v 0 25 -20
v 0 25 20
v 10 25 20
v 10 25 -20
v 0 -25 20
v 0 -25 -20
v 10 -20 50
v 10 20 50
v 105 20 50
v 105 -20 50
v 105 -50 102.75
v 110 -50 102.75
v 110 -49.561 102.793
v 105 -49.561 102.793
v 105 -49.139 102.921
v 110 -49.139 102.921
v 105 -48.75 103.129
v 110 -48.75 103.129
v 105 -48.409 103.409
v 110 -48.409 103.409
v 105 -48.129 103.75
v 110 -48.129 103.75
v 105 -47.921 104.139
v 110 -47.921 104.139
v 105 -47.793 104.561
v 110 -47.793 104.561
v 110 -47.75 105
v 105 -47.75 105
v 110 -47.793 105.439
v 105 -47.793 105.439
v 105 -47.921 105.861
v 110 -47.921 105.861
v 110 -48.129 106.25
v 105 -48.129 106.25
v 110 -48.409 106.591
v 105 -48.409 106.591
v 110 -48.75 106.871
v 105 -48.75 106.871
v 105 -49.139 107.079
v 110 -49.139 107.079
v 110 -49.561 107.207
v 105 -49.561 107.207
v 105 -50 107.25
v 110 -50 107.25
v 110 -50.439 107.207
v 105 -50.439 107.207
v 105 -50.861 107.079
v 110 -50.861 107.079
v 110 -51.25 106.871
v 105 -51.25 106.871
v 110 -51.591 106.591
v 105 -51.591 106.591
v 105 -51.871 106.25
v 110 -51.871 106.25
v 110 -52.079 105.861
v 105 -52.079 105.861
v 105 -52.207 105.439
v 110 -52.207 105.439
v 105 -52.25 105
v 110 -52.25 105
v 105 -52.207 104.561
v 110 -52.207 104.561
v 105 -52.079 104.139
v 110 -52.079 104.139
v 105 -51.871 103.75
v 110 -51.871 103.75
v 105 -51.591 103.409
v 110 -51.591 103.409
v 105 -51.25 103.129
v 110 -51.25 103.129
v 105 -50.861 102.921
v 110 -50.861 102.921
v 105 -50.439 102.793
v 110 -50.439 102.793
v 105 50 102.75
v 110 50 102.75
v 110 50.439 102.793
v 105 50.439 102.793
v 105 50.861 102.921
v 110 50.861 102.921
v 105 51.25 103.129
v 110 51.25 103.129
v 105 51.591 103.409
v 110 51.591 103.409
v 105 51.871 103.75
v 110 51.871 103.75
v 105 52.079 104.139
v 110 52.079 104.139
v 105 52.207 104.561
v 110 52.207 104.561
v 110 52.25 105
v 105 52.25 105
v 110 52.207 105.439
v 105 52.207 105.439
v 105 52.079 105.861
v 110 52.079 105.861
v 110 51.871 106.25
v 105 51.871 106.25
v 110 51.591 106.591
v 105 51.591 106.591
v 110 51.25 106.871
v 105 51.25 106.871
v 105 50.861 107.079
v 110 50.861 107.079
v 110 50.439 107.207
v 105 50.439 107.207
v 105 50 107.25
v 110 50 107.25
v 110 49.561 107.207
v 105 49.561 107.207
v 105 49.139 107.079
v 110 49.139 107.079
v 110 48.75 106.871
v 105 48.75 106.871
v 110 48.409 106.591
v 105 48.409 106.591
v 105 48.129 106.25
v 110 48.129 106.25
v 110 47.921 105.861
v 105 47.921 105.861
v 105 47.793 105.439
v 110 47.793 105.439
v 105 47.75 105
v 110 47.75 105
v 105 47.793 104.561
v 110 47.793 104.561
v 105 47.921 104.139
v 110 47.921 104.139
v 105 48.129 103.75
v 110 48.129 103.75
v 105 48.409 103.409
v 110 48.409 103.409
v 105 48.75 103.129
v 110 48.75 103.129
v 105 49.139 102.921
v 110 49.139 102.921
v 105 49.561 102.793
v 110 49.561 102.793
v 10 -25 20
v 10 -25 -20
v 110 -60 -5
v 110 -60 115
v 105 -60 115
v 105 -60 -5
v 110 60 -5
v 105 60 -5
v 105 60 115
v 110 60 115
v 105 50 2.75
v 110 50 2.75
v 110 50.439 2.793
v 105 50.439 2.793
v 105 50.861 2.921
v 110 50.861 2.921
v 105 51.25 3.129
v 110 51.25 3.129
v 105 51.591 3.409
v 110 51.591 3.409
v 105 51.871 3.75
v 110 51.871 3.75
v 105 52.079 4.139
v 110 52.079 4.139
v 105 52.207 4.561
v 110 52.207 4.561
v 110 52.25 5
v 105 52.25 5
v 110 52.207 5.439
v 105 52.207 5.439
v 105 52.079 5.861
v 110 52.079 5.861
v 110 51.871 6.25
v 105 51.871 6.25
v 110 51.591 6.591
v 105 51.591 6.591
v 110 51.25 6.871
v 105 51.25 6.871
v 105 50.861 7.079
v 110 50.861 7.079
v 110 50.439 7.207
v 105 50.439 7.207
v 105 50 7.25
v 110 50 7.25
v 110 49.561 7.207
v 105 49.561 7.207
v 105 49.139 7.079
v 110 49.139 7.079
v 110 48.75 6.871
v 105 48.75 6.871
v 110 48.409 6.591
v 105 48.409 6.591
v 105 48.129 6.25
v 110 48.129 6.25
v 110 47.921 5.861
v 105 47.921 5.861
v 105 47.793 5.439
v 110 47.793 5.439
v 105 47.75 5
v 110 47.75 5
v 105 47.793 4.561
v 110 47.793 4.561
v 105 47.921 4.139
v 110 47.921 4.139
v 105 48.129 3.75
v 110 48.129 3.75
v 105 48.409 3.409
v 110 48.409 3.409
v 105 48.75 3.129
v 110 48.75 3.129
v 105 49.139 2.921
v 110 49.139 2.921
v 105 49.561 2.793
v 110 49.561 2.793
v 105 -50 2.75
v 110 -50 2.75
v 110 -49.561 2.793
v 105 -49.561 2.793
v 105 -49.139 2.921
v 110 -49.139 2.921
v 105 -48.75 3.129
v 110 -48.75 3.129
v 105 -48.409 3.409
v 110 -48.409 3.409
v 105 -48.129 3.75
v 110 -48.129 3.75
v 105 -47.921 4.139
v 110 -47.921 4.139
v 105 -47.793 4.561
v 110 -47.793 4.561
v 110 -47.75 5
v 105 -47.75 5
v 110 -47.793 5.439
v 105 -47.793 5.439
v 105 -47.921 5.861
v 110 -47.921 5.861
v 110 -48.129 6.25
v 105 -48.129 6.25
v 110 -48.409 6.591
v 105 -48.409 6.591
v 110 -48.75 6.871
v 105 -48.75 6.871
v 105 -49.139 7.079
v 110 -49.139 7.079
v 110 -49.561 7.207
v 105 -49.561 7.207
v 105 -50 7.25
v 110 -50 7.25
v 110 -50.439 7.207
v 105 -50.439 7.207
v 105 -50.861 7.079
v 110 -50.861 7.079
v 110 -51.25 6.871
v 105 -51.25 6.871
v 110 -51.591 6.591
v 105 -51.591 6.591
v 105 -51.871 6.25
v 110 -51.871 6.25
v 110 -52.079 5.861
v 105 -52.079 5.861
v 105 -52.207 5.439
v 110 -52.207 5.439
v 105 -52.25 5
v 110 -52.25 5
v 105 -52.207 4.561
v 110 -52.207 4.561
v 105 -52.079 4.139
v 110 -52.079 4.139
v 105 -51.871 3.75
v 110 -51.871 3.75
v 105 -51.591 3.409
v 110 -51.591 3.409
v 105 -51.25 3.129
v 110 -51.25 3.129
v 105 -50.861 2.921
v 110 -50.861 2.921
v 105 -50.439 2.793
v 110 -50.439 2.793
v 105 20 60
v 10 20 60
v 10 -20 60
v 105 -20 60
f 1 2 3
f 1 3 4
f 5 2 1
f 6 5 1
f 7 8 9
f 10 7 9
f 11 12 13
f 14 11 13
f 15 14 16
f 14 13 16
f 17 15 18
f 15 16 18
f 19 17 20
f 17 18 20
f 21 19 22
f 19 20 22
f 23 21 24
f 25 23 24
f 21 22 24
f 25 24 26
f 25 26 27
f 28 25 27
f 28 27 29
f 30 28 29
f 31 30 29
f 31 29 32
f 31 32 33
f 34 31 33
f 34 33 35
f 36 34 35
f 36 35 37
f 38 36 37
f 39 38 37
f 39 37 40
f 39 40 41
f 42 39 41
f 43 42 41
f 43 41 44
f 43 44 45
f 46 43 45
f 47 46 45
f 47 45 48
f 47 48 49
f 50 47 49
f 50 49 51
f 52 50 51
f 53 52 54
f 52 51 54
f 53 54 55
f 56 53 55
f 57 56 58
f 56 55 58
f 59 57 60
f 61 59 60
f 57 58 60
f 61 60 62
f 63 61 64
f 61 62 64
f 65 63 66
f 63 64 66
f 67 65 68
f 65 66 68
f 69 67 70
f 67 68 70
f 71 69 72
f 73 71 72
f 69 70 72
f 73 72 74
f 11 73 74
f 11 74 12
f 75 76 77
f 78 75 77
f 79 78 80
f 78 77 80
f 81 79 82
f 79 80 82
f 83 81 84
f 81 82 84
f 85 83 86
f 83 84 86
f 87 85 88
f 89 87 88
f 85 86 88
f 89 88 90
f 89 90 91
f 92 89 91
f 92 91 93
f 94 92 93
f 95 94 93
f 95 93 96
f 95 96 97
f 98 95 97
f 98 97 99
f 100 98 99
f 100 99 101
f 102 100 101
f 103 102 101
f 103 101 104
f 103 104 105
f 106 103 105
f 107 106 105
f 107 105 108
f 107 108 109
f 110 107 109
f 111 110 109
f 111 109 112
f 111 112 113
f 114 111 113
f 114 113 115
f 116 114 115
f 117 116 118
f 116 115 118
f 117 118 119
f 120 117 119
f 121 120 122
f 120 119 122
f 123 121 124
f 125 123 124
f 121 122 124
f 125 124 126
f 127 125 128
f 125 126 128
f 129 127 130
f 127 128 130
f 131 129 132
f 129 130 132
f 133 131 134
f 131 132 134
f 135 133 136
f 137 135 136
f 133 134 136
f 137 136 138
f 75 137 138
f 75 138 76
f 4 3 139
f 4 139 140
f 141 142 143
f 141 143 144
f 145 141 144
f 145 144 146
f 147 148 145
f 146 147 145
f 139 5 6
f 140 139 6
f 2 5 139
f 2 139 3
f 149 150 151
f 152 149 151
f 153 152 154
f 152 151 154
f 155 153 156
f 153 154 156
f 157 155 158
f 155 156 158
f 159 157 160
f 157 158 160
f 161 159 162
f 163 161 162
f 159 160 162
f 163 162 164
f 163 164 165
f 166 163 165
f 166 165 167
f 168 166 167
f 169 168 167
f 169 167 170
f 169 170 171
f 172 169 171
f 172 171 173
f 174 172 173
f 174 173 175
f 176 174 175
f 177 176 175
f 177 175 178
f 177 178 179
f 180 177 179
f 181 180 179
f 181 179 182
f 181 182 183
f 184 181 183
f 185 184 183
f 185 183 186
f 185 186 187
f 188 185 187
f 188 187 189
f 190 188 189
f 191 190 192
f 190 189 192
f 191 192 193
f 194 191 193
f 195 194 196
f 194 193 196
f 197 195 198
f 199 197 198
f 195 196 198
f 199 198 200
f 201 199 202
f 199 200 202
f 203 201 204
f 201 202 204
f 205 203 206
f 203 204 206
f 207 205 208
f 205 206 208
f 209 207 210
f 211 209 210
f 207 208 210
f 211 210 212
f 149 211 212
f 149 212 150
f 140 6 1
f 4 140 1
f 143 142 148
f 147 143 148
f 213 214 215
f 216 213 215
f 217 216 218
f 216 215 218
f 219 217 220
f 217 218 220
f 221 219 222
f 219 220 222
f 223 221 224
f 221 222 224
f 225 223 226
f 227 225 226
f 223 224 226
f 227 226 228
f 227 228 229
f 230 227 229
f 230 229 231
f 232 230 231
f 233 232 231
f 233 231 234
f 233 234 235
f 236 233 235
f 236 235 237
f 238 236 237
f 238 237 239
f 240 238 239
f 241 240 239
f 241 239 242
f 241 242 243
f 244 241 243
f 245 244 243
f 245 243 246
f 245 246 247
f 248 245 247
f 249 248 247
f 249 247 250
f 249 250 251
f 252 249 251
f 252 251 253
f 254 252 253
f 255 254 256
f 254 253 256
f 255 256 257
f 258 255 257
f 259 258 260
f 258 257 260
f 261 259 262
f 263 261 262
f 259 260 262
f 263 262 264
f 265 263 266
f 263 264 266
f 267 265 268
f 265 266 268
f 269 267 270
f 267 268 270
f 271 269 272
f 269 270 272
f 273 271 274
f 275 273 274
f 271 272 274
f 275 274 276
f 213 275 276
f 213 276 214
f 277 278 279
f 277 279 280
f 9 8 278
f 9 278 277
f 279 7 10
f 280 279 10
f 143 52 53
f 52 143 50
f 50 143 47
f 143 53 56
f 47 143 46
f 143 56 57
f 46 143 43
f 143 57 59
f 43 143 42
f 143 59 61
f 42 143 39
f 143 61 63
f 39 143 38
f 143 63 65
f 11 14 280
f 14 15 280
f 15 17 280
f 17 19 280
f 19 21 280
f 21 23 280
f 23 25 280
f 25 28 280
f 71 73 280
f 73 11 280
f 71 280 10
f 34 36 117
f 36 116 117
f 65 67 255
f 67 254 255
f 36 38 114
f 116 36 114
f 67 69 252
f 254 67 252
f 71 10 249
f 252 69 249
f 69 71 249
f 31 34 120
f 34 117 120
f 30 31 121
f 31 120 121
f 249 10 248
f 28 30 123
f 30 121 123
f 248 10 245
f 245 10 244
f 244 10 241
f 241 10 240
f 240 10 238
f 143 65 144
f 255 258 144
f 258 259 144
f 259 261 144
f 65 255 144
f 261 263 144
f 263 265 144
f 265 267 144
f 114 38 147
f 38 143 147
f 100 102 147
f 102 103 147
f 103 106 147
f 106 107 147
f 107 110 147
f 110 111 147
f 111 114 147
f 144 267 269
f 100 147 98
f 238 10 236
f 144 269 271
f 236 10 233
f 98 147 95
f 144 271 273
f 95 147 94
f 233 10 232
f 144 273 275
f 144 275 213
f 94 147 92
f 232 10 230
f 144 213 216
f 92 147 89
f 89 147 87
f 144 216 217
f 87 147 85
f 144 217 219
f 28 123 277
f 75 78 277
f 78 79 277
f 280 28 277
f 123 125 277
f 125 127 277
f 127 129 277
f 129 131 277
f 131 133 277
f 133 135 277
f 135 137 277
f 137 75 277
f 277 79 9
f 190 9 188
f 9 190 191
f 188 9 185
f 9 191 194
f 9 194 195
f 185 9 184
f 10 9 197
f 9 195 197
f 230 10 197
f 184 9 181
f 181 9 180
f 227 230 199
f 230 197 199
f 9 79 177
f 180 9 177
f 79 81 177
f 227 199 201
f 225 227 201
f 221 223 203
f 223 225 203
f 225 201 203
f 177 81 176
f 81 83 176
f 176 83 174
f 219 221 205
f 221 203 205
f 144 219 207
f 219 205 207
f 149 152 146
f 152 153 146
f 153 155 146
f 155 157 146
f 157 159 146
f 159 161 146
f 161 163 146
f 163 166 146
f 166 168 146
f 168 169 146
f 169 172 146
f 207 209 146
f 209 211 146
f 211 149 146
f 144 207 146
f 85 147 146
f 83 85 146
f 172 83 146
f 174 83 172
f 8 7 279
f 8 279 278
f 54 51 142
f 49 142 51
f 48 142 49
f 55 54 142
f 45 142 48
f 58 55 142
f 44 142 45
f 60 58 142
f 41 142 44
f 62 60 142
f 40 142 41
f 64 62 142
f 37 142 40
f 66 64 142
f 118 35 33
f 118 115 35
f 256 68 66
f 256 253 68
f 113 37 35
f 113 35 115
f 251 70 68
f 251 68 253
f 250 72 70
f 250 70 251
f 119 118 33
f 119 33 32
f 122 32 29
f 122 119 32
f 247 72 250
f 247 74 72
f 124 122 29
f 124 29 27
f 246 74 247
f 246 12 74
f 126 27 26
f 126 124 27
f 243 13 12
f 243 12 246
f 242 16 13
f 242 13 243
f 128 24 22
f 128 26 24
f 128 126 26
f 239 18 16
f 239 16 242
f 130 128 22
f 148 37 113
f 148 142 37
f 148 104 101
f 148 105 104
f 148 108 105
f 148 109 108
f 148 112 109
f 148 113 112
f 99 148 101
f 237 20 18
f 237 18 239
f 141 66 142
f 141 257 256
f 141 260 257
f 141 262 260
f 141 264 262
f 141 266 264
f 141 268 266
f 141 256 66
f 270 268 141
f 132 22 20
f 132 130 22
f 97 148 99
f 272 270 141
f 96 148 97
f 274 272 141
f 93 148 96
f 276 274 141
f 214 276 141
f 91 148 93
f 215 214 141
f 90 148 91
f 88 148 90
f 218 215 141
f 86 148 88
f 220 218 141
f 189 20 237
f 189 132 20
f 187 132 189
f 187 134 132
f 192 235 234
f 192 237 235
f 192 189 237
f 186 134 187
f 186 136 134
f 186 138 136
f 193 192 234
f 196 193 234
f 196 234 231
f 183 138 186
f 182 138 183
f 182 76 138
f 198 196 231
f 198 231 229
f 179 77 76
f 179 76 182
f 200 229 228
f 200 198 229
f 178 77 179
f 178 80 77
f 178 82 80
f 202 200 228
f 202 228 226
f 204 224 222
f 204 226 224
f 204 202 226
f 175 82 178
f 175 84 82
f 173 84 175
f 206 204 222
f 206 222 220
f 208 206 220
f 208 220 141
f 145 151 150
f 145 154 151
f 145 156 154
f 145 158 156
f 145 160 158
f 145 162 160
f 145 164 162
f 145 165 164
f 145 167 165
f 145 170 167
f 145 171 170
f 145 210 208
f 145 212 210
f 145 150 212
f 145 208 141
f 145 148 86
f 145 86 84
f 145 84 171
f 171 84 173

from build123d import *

# Parameters (mm, degrees)
SKETCH1_W           = 40
SKETCH1_H           = 50
BOSS_EXTRUDE1_DEPTH = 10
SKETCH2_W           = 100
SKETCH2_H           = 40
BOSS_EXTRUDE2_DEPTH = 10
SKETCH3_W           = 120
SKETCH3_H           = 120
BOSS_EXTRUDE3_DEPTH = 5
SKETCH4_R           = 2.25
CUT_EXTRUDE1_DEPTH  = 10


with BuildPart() as part:
    # Sketch1 → Boss-Extrude1 (new body)
    with BuildSketch(Plane(origin=(0, 0, 0), x_dir=(0, 0, -1), z_dir=(1, 0, 0))):
        Rectangle(SKETCH1_W, SKETCH1_H)
    extrude(amount=BOSS_EXTRUDE1_DEPTH)


with BuildPart() as body_2:
    # Sketch2 → Boss-Extrude2 (new body)
    with BuildSketch(Plane.XY.offset(50)):
        with Locations((60, 0)):
            Rectangle(SKETCH2_W, SKETCH2_H)
    extrude(amount=BOSS_EXTRUDE2_DEPTH)

    # Sketch3 → Boss-Extrude3 (add)
    with BuildSketch(Plane(origin=(110, 0, 0), x_dir=(0, 0, -1), z_dir=(1, 0, 0))):
        with Locations((-55, 0)):
            Rectangle(SKETCH3_W, SKETCH3_H)
    extrude(amount=-BOSS_EXTRUDE3_DEPTH)

    # Sketch4 → Cut-Extrude1 (cut)
    with BuildSketch(Plane(origin=(110, 0, 0), x_dir=(0, 0, -1), z_dir=(1, 0, 0))):
        with Locations((-105, -50)):
            Circle(SKETCH4_R)
        with Locations((-105, 50)):
            Circle(SKETCH4_R)
        with Locations((-5, -50)):
            Circle(SKETCH4_R)
        with Locations((-5, 50)):
            Circle(SKETCH4_R)
    extrude(amount=-CUT_EXTRUDE1_DEPTH, mode=Mode.SUBTRACT)


solid = Compound([part.part, body_2.part])
